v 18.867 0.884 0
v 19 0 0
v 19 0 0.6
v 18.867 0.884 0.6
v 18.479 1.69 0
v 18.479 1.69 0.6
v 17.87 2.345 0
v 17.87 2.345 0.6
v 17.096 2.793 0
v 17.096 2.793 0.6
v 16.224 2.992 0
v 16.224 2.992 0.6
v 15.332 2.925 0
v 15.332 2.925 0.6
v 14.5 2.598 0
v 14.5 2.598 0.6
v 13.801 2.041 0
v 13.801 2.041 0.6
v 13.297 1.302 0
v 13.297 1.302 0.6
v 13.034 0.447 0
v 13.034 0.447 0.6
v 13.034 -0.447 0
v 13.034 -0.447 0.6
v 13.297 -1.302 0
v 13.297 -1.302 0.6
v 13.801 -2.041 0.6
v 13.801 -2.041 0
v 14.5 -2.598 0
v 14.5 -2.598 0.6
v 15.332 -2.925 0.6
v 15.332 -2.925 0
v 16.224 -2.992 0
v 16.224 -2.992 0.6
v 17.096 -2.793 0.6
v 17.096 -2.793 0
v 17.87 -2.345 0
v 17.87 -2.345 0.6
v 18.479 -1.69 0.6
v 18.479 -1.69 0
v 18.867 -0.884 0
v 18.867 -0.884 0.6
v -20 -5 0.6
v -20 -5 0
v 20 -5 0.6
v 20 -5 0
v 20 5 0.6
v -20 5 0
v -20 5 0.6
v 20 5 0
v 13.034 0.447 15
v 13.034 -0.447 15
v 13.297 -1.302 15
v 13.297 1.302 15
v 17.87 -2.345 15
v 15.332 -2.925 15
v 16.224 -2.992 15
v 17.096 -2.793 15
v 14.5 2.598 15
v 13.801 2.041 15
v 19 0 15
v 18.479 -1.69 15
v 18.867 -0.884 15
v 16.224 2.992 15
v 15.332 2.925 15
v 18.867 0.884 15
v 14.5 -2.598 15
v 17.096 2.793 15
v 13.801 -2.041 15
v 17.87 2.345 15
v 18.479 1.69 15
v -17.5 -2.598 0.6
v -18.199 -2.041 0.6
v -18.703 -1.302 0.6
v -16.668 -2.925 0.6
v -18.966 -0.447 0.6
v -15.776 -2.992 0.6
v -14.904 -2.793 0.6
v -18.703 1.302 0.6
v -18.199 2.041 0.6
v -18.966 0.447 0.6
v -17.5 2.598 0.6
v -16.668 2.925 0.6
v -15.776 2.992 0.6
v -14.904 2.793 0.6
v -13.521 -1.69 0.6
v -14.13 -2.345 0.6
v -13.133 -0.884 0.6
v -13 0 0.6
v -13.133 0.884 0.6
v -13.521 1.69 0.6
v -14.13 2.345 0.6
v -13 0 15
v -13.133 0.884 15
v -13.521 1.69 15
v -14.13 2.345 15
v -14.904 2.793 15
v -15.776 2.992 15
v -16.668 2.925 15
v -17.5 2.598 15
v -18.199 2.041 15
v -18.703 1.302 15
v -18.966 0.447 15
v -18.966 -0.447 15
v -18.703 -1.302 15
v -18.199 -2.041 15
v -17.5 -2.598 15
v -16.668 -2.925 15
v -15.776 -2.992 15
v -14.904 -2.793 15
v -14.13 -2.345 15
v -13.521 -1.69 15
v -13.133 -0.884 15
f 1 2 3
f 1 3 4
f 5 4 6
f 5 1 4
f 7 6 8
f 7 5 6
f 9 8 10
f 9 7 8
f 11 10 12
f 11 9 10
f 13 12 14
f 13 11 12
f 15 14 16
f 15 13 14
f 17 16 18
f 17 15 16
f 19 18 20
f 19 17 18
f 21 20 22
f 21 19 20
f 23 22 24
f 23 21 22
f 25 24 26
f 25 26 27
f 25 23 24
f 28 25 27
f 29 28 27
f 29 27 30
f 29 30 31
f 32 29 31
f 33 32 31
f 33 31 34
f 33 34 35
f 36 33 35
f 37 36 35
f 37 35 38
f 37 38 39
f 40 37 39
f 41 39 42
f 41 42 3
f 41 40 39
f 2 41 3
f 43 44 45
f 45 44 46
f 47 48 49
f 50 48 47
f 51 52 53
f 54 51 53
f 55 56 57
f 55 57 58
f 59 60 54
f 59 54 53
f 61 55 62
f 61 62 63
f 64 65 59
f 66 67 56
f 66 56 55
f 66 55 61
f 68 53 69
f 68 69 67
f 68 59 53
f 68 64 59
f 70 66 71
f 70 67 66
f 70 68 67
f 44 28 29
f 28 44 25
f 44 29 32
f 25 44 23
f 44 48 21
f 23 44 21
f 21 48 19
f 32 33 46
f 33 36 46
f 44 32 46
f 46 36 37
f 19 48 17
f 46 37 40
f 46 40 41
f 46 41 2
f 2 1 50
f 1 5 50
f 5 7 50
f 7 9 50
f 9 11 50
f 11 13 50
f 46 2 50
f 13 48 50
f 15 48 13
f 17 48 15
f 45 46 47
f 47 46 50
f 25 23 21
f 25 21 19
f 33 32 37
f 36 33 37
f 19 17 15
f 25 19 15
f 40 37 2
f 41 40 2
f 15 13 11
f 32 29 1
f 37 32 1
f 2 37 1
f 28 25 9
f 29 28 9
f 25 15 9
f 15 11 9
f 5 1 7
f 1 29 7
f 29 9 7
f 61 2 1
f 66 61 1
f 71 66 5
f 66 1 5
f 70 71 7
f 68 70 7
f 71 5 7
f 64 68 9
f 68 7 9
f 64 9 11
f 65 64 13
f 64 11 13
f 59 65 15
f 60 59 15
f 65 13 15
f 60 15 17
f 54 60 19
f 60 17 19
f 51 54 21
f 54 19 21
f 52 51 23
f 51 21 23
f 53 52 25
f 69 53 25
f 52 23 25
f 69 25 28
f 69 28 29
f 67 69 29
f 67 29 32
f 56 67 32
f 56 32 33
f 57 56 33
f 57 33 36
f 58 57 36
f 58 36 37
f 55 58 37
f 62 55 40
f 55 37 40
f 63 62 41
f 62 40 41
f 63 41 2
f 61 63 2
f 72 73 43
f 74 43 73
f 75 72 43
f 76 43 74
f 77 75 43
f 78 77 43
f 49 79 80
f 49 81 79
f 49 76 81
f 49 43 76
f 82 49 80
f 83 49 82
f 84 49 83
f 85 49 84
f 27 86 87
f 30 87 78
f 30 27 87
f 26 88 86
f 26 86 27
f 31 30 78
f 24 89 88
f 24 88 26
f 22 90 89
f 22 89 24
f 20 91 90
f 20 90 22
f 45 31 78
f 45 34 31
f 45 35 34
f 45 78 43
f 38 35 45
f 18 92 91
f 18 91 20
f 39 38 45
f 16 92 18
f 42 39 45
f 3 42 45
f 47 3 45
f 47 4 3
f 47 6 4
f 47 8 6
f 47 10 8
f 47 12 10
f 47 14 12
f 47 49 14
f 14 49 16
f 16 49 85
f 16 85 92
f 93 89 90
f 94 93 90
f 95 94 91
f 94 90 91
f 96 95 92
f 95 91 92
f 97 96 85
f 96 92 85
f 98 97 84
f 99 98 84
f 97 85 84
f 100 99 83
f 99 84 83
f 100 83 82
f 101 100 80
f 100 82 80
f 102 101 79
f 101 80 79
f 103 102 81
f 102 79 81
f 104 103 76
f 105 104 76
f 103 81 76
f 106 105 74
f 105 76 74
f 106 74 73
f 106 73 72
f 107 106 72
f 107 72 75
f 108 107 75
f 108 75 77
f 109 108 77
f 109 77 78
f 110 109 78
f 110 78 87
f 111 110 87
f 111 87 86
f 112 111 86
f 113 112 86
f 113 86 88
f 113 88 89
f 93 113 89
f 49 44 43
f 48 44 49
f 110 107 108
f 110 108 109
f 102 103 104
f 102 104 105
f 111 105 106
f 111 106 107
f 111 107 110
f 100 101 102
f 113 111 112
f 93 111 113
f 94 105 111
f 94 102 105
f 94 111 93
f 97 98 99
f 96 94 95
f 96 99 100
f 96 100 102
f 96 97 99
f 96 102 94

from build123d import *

# Parameters (mm, degrees)
F0_W     = 40
F0_H     = 10
F0_R     = 3
F1_DEPTH = 0.6
F2_DEPTH = 15
F3_DEPTH = 15


with BuildPart() as f1:
    # F0 (on Top) → F1 (new body)
    with BuildSketch(Plane.XY):
        Rectangle(F0_W, F0_H)
        with Locations((-16, 0)):
            Circle(F0_R, mode=Mode.SUBTRACT)
        with Locations((16, 0)):
            Circle(F0_R, mode=Mode.SUBTRACT)
    extrude(amount=F1_DEPTH)

    # F0 (on Top) → F2 (join)
    with BuildSketch(Plane.XY):
        with Locations((-16, 0)):
            Circle(F0_R)
    extrude(amount=F2_DEPTH)


with BuildPart() as f3:
    # F0 (on Top) → F3 (new body)
    with BuildSketch(Plane.XY):
        with Locations((16, 0)):
            Circle(F0_R)
    extrude(amount=F3_DEPTH)


solid = Compound([f1.part, f3.part])
